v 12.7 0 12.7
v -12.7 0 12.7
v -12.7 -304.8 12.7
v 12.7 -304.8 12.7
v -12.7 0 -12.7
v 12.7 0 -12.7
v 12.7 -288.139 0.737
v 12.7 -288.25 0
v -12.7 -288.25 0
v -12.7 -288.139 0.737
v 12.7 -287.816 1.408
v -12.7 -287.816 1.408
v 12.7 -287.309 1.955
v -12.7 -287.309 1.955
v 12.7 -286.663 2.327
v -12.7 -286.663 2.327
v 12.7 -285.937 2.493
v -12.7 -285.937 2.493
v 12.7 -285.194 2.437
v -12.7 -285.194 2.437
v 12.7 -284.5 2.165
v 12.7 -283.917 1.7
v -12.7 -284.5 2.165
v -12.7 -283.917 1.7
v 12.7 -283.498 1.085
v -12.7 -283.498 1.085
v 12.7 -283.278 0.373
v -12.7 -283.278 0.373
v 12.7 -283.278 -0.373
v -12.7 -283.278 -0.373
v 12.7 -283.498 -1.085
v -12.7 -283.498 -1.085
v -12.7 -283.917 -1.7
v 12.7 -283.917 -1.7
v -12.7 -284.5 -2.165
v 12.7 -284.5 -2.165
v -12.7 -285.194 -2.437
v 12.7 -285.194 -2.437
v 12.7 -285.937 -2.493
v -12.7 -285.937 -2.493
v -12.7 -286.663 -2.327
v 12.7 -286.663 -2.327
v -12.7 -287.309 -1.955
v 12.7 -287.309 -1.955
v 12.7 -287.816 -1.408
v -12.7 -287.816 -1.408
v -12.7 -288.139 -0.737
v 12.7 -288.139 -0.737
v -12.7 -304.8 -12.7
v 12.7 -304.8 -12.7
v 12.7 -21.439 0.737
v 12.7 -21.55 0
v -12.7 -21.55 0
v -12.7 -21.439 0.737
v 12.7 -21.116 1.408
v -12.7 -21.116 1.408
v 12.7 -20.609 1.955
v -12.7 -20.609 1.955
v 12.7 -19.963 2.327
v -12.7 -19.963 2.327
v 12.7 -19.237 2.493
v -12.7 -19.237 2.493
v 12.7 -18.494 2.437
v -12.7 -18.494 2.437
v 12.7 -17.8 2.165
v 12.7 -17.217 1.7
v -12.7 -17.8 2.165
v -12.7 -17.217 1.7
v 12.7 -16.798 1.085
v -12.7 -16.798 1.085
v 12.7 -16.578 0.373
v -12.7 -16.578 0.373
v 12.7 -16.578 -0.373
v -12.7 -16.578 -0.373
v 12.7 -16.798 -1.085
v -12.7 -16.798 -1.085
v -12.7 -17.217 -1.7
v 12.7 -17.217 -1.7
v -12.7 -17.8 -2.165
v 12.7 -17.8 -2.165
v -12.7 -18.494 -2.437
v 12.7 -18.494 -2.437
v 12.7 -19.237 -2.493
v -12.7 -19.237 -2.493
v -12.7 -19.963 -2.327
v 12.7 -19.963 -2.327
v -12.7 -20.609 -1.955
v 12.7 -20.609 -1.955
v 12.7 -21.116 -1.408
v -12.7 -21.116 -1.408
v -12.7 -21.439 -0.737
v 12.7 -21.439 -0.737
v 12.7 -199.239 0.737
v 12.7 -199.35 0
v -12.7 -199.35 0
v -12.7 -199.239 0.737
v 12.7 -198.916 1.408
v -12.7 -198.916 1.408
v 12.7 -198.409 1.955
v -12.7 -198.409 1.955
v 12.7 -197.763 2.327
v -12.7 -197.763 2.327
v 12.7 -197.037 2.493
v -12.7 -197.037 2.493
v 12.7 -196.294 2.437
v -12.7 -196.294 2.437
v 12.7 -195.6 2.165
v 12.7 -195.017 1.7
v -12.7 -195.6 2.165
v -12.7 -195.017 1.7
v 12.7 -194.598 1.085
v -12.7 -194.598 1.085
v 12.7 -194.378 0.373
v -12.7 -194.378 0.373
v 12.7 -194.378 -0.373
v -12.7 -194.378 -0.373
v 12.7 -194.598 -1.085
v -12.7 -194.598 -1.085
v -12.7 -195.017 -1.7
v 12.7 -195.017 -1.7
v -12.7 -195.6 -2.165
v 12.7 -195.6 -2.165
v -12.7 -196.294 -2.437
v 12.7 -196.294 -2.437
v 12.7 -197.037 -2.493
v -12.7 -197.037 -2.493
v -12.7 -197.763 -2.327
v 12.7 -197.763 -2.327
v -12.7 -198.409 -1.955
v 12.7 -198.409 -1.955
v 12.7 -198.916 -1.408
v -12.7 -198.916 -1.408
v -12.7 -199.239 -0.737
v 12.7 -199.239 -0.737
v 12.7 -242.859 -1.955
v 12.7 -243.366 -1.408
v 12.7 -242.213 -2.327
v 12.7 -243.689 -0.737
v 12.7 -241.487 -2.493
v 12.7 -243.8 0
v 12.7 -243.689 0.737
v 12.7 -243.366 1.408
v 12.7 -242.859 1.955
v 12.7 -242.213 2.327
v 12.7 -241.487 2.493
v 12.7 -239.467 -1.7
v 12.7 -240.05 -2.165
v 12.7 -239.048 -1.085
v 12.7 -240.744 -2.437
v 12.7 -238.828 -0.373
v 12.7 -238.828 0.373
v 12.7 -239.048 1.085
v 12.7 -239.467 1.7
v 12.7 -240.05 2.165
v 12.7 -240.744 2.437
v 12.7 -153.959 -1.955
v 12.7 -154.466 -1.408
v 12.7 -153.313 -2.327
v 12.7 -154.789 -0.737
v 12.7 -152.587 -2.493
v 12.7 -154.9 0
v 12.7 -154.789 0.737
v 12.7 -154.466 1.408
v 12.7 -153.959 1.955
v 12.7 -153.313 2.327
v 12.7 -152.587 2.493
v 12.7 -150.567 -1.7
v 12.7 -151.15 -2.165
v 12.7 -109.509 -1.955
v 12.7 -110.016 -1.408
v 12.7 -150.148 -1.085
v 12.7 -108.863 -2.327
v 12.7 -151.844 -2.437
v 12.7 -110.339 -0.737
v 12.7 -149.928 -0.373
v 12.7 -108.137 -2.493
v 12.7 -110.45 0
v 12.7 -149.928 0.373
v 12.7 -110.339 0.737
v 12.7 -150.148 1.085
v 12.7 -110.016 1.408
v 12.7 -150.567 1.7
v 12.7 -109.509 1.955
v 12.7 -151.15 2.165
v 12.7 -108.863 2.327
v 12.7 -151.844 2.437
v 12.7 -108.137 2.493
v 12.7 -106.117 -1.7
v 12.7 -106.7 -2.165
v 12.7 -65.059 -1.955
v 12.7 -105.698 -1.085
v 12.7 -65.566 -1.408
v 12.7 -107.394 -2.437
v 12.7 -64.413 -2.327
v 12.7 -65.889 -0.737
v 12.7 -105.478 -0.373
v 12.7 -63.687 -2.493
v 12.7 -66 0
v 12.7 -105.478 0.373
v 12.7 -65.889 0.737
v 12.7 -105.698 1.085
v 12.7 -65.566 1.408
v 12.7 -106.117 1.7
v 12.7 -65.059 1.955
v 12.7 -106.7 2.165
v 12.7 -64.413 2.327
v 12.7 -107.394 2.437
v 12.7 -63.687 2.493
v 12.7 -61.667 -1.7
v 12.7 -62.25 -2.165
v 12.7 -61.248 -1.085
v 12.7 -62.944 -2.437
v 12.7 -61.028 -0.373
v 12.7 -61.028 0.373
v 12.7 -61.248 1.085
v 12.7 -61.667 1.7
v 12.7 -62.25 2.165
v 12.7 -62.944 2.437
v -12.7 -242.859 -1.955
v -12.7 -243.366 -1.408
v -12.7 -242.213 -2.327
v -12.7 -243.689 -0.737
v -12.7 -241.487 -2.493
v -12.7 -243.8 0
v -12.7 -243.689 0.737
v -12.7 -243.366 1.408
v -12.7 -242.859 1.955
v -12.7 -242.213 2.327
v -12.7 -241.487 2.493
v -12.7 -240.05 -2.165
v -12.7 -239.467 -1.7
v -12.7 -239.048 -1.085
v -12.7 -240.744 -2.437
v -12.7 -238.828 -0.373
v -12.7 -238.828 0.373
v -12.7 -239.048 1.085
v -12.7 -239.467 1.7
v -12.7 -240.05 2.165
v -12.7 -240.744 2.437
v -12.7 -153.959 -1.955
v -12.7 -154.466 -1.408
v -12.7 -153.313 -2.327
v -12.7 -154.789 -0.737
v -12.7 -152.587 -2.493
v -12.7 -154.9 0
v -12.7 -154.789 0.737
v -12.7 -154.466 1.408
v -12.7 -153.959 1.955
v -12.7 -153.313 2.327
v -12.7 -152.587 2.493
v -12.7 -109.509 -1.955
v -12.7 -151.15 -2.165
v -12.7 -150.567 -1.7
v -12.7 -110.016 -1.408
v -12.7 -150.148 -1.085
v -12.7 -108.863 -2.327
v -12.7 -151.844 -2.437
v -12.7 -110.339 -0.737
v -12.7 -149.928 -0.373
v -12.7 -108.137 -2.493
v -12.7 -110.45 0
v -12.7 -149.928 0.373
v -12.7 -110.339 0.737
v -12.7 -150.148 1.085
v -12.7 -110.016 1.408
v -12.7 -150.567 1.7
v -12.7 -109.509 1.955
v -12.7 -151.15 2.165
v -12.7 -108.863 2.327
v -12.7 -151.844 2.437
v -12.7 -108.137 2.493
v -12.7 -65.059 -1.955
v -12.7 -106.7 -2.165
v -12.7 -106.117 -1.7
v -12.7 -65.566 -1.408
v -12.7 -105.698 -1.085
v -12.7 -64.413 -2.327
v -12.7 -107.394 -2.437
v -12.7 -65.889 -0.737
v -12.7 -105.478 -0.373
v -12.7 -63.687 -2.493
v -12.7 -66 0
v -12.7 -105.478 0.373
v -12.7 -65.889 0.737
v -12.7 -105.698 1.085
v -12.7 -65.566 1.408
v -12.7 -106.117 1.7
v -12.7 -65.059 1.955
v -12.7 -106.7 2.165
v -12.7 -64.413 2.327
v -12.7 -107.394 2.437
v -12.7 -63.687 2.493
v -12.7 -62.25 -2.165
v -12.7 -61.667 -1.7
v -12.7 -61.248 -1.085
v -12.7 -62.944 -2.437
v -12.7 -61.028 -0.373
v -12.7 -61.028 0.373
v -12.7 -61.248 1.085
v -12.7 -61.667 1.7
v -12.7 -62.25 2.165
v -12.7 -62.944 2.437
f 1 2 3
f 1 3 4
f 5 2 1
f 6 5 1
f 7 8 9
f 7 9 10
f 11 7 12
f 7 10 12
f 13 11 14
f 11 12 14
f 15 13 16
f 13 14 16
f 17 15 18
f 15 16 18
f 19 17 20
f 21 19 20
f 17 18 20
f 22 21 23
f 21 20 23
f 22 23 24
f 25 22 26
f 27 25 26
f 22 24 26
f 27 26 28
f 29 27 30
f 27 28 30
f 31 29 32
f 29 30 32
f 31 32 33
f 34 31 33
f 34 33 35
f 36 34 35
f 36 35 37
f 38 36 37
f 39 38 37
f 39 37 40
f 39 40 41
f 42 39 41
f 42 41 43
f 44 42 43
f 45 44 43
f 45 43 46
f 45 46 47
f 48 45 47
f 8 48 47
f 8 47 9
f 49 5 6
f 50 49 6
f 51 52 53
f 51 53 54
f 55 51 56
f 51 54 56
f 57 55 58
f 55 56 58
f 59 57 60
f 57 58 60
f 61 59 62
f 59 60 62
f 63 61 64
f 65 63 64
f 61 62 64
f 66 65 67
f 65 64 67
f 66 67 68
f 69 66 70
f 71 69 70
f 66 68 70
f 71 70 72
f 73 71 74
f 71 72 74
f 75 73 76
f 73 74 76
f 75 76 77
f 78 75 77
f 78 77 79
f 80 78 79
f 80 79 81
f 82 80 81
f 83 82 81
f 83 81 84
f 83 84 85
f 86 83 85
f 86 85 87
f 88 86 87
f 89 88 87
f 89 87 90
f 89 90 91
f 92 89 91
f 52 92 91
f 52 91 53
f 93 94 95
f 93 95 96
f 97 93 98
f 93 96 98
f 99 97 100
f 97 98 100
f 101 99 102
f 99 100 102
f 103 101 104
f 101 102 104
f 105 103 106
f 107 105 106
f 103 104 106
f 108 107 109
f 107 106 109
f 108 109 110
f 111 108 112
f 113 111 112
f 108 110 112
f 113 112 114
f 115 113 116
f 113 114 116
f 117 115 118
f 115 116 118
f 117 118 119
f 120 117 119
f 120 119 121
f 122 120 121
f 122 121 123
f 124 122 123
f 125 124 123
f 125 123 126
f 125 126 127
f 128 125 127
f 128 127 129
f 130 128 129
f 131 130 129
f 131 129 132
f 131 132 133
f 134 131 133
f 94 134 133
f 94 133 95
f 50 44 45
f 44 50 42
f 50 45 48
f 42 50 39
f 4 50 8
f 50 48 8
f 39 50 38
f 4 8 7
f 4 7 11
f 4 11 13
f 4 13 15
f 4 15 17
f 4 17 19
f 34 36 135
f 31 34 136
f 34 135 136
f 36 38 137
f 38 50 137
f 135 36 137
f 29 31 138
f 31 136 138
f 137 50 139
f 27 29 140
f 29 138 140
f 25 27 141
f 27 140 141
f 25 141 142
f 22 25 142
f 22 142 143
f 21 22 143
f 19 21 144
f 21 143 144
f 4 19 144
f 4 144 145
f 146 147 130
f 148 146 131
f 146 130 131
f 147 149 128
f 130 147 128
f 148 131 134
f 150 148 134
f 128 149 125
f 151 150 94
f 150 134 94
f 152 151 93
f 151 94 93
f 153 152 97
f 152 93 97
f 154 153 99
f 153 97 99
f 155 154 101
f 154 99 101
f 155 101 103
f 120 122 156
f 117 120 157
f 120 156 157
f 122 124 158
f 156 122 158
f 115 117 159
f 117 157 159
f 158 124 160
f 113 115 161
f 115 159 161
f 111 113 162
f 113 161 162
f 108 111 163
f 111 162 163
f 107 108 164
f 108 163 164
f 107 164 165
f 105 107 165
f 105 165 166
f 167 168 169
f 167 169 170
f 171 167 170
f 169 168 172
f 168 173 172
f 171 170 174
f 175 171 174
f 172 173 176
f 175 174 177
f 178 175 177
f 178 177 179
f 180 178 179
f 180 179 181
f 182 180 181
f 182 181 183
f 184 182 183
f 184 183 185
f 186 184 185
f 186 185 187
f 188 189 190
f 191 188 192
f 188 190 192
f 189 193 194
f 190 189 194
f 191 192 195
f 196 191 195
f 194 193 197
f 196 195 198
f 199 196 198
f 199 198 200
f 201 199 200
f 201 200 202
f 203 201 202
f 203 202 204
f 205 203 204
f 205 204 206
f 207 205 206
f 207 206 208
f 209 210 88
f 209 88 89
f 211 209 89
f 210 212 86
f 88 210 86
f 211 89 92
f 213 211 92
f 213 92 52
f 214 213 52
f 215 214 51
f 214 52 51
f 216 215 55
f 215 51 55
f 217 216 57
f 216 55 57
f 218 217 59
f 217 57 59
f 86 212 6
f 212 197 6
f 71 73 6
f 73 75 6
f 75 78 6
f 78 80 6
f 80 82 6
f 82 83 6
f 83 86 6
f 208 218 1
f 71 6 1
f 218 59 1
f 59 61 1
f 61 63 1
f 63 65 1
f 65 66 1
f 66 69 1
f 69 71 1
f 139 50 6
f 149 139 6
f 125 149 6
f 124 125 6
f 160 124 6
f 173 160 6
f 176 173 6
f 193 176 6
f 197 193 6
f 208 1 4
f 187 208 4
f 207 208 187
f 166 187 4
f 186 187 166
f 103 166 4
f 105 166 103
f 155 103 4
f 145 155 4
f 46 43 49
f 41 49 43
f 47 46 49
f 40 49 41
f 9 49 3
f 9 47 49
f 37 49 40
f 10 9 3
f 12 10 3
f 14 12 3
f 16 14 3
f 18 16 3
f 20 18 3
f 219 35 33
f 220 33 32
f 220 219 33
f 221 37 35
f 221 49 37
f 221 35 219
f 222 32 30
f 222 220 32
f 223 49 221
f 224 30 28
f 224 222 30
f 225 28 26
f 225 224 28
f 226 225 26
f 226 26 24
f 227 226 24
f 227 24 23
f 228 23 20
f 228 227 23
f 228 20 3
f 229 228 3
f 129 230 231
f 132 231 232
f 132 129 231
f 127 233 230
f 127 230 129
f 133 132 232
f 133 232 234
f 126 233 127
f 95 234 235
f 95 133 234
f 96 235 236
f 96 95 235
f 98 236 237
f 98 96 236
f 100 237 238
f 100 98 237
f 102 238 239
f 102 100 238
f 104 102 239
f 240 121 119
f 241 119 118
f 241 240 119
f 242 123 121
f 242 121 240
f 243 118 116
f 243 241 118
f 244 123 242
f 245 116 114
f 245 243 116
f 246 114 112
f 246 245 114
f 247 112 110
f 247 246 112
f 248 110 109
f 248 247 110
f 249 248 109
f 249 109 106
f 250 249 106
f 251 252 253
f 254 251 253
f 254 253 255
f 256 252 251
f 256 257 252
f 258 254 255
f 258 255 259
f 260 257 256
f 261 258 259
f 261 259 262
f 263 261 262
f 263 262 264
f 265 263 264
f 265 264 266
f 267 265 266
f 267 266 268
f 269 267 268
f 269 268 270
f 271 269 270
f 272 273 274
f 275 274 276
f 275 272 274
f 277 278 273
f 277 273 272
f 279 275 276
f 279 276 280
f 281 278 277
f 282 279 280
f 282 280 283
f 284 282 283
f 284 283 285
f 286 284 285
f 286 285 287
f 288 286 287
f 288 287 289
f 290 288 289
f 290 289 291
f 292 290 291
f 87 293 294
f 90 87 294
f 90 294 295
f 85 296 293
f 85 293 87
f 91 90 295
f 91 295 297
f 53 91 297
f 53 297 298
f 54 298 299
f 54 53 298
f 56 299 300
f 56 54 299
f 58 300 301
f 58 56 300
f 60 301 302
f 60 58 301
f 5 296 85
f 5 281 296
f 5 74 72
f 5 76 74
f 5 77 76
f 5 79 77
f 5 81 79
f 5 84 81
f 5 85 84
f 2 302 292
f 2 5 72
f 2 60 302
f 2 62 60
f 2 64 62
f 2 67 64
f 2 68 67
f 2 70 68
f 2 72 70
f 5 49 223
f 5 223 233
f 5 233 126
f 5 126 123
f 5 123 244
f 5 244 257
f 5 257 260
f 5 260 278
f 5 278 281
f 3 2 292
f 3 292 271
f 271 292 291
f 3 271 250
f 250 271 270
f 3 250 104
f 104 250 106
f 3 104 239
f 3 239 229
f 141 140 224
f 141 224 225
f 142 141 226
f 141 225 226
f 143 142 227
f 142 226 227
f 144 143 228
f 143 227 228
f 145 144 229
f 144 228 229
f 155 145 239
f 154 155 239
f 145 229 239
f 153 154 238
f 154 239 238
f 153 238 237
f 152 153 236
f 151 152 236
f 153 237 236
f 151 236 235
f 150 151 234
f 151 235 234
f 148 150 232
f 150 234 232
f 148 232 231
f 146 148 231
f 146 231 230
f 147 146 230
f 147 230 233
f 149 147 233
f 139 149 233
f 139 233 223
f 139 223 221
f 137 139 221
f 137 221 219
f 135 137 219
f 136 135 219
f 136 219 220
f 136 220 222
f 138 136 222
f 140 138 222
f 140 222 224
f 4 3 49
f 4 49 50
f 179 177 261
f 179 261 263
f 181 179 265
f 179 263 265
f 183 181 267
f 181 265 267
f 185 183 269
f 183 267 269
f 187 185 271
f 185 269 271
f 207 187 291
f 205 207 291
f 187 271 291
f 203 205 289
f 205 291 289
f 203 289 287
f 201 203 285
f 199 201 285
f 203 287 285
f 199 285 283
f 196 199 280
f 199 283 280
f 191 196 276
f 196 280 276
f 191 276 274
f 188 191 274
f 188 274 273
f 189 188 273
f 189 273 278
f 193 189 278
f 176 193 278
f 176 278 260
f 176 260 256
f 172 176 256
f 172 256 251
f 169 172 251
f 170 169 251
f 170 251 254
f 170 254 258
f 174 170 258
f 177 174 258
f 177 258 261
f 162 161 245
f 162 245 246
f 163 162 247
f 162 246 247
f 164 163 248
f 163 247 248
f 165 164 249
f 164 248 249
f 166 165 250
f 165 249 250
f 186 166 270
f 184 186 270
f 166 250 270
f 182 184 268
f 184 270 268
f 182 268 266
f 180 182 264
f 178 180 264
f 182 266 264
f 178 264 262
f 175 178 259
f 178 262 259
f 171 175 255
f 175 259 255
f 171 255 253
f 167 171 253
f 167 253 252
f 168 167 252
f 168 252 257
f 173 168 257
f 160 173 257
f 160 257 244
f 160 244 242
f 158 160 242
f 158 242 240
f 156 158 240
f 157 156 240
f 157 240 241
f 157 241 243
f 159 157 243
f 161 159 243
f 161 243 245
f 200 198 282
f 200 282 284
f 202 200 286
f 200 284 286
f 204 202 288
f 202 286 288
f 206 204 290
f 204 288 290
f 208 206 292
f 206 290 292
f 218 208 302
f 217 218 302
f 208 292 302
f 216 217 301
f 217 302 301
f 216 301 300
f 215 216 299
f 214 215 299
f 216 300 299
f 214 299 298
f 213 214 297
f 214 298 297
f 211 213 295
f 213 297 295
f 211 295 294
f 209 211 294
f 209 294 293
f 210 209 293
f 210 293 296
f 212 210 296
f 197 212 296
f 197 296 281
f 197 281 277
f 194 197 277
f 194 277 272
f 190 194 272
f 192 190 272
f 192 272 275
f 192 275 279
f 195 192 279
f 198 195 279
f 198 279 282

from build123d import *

# Parameters (mm, degrees)
F0_W     = 25.4
F0_H     = 25.4
F1_DEPTH = 304.8
F3_D     = 5


with BuildPart() as f1:
    # F0 (on Front) → F1 (new body)
    with BuildSketch(Plane.XZ):
        Rectangle(F0_W, F0_H)
    extrude(amount=F1_DEPTH)

    # F3 (through all)
    with Locations(Plane.YZ.offset(12.7)):
        with Locations((-285.75, 0), (-241.3, 0), (-196.85, 0), (-152.4, 0), (-107.95, 0), (-63.5, 0), (-19.05, 0)):
            Hole(F3_D / 2)


solid = f1.part
